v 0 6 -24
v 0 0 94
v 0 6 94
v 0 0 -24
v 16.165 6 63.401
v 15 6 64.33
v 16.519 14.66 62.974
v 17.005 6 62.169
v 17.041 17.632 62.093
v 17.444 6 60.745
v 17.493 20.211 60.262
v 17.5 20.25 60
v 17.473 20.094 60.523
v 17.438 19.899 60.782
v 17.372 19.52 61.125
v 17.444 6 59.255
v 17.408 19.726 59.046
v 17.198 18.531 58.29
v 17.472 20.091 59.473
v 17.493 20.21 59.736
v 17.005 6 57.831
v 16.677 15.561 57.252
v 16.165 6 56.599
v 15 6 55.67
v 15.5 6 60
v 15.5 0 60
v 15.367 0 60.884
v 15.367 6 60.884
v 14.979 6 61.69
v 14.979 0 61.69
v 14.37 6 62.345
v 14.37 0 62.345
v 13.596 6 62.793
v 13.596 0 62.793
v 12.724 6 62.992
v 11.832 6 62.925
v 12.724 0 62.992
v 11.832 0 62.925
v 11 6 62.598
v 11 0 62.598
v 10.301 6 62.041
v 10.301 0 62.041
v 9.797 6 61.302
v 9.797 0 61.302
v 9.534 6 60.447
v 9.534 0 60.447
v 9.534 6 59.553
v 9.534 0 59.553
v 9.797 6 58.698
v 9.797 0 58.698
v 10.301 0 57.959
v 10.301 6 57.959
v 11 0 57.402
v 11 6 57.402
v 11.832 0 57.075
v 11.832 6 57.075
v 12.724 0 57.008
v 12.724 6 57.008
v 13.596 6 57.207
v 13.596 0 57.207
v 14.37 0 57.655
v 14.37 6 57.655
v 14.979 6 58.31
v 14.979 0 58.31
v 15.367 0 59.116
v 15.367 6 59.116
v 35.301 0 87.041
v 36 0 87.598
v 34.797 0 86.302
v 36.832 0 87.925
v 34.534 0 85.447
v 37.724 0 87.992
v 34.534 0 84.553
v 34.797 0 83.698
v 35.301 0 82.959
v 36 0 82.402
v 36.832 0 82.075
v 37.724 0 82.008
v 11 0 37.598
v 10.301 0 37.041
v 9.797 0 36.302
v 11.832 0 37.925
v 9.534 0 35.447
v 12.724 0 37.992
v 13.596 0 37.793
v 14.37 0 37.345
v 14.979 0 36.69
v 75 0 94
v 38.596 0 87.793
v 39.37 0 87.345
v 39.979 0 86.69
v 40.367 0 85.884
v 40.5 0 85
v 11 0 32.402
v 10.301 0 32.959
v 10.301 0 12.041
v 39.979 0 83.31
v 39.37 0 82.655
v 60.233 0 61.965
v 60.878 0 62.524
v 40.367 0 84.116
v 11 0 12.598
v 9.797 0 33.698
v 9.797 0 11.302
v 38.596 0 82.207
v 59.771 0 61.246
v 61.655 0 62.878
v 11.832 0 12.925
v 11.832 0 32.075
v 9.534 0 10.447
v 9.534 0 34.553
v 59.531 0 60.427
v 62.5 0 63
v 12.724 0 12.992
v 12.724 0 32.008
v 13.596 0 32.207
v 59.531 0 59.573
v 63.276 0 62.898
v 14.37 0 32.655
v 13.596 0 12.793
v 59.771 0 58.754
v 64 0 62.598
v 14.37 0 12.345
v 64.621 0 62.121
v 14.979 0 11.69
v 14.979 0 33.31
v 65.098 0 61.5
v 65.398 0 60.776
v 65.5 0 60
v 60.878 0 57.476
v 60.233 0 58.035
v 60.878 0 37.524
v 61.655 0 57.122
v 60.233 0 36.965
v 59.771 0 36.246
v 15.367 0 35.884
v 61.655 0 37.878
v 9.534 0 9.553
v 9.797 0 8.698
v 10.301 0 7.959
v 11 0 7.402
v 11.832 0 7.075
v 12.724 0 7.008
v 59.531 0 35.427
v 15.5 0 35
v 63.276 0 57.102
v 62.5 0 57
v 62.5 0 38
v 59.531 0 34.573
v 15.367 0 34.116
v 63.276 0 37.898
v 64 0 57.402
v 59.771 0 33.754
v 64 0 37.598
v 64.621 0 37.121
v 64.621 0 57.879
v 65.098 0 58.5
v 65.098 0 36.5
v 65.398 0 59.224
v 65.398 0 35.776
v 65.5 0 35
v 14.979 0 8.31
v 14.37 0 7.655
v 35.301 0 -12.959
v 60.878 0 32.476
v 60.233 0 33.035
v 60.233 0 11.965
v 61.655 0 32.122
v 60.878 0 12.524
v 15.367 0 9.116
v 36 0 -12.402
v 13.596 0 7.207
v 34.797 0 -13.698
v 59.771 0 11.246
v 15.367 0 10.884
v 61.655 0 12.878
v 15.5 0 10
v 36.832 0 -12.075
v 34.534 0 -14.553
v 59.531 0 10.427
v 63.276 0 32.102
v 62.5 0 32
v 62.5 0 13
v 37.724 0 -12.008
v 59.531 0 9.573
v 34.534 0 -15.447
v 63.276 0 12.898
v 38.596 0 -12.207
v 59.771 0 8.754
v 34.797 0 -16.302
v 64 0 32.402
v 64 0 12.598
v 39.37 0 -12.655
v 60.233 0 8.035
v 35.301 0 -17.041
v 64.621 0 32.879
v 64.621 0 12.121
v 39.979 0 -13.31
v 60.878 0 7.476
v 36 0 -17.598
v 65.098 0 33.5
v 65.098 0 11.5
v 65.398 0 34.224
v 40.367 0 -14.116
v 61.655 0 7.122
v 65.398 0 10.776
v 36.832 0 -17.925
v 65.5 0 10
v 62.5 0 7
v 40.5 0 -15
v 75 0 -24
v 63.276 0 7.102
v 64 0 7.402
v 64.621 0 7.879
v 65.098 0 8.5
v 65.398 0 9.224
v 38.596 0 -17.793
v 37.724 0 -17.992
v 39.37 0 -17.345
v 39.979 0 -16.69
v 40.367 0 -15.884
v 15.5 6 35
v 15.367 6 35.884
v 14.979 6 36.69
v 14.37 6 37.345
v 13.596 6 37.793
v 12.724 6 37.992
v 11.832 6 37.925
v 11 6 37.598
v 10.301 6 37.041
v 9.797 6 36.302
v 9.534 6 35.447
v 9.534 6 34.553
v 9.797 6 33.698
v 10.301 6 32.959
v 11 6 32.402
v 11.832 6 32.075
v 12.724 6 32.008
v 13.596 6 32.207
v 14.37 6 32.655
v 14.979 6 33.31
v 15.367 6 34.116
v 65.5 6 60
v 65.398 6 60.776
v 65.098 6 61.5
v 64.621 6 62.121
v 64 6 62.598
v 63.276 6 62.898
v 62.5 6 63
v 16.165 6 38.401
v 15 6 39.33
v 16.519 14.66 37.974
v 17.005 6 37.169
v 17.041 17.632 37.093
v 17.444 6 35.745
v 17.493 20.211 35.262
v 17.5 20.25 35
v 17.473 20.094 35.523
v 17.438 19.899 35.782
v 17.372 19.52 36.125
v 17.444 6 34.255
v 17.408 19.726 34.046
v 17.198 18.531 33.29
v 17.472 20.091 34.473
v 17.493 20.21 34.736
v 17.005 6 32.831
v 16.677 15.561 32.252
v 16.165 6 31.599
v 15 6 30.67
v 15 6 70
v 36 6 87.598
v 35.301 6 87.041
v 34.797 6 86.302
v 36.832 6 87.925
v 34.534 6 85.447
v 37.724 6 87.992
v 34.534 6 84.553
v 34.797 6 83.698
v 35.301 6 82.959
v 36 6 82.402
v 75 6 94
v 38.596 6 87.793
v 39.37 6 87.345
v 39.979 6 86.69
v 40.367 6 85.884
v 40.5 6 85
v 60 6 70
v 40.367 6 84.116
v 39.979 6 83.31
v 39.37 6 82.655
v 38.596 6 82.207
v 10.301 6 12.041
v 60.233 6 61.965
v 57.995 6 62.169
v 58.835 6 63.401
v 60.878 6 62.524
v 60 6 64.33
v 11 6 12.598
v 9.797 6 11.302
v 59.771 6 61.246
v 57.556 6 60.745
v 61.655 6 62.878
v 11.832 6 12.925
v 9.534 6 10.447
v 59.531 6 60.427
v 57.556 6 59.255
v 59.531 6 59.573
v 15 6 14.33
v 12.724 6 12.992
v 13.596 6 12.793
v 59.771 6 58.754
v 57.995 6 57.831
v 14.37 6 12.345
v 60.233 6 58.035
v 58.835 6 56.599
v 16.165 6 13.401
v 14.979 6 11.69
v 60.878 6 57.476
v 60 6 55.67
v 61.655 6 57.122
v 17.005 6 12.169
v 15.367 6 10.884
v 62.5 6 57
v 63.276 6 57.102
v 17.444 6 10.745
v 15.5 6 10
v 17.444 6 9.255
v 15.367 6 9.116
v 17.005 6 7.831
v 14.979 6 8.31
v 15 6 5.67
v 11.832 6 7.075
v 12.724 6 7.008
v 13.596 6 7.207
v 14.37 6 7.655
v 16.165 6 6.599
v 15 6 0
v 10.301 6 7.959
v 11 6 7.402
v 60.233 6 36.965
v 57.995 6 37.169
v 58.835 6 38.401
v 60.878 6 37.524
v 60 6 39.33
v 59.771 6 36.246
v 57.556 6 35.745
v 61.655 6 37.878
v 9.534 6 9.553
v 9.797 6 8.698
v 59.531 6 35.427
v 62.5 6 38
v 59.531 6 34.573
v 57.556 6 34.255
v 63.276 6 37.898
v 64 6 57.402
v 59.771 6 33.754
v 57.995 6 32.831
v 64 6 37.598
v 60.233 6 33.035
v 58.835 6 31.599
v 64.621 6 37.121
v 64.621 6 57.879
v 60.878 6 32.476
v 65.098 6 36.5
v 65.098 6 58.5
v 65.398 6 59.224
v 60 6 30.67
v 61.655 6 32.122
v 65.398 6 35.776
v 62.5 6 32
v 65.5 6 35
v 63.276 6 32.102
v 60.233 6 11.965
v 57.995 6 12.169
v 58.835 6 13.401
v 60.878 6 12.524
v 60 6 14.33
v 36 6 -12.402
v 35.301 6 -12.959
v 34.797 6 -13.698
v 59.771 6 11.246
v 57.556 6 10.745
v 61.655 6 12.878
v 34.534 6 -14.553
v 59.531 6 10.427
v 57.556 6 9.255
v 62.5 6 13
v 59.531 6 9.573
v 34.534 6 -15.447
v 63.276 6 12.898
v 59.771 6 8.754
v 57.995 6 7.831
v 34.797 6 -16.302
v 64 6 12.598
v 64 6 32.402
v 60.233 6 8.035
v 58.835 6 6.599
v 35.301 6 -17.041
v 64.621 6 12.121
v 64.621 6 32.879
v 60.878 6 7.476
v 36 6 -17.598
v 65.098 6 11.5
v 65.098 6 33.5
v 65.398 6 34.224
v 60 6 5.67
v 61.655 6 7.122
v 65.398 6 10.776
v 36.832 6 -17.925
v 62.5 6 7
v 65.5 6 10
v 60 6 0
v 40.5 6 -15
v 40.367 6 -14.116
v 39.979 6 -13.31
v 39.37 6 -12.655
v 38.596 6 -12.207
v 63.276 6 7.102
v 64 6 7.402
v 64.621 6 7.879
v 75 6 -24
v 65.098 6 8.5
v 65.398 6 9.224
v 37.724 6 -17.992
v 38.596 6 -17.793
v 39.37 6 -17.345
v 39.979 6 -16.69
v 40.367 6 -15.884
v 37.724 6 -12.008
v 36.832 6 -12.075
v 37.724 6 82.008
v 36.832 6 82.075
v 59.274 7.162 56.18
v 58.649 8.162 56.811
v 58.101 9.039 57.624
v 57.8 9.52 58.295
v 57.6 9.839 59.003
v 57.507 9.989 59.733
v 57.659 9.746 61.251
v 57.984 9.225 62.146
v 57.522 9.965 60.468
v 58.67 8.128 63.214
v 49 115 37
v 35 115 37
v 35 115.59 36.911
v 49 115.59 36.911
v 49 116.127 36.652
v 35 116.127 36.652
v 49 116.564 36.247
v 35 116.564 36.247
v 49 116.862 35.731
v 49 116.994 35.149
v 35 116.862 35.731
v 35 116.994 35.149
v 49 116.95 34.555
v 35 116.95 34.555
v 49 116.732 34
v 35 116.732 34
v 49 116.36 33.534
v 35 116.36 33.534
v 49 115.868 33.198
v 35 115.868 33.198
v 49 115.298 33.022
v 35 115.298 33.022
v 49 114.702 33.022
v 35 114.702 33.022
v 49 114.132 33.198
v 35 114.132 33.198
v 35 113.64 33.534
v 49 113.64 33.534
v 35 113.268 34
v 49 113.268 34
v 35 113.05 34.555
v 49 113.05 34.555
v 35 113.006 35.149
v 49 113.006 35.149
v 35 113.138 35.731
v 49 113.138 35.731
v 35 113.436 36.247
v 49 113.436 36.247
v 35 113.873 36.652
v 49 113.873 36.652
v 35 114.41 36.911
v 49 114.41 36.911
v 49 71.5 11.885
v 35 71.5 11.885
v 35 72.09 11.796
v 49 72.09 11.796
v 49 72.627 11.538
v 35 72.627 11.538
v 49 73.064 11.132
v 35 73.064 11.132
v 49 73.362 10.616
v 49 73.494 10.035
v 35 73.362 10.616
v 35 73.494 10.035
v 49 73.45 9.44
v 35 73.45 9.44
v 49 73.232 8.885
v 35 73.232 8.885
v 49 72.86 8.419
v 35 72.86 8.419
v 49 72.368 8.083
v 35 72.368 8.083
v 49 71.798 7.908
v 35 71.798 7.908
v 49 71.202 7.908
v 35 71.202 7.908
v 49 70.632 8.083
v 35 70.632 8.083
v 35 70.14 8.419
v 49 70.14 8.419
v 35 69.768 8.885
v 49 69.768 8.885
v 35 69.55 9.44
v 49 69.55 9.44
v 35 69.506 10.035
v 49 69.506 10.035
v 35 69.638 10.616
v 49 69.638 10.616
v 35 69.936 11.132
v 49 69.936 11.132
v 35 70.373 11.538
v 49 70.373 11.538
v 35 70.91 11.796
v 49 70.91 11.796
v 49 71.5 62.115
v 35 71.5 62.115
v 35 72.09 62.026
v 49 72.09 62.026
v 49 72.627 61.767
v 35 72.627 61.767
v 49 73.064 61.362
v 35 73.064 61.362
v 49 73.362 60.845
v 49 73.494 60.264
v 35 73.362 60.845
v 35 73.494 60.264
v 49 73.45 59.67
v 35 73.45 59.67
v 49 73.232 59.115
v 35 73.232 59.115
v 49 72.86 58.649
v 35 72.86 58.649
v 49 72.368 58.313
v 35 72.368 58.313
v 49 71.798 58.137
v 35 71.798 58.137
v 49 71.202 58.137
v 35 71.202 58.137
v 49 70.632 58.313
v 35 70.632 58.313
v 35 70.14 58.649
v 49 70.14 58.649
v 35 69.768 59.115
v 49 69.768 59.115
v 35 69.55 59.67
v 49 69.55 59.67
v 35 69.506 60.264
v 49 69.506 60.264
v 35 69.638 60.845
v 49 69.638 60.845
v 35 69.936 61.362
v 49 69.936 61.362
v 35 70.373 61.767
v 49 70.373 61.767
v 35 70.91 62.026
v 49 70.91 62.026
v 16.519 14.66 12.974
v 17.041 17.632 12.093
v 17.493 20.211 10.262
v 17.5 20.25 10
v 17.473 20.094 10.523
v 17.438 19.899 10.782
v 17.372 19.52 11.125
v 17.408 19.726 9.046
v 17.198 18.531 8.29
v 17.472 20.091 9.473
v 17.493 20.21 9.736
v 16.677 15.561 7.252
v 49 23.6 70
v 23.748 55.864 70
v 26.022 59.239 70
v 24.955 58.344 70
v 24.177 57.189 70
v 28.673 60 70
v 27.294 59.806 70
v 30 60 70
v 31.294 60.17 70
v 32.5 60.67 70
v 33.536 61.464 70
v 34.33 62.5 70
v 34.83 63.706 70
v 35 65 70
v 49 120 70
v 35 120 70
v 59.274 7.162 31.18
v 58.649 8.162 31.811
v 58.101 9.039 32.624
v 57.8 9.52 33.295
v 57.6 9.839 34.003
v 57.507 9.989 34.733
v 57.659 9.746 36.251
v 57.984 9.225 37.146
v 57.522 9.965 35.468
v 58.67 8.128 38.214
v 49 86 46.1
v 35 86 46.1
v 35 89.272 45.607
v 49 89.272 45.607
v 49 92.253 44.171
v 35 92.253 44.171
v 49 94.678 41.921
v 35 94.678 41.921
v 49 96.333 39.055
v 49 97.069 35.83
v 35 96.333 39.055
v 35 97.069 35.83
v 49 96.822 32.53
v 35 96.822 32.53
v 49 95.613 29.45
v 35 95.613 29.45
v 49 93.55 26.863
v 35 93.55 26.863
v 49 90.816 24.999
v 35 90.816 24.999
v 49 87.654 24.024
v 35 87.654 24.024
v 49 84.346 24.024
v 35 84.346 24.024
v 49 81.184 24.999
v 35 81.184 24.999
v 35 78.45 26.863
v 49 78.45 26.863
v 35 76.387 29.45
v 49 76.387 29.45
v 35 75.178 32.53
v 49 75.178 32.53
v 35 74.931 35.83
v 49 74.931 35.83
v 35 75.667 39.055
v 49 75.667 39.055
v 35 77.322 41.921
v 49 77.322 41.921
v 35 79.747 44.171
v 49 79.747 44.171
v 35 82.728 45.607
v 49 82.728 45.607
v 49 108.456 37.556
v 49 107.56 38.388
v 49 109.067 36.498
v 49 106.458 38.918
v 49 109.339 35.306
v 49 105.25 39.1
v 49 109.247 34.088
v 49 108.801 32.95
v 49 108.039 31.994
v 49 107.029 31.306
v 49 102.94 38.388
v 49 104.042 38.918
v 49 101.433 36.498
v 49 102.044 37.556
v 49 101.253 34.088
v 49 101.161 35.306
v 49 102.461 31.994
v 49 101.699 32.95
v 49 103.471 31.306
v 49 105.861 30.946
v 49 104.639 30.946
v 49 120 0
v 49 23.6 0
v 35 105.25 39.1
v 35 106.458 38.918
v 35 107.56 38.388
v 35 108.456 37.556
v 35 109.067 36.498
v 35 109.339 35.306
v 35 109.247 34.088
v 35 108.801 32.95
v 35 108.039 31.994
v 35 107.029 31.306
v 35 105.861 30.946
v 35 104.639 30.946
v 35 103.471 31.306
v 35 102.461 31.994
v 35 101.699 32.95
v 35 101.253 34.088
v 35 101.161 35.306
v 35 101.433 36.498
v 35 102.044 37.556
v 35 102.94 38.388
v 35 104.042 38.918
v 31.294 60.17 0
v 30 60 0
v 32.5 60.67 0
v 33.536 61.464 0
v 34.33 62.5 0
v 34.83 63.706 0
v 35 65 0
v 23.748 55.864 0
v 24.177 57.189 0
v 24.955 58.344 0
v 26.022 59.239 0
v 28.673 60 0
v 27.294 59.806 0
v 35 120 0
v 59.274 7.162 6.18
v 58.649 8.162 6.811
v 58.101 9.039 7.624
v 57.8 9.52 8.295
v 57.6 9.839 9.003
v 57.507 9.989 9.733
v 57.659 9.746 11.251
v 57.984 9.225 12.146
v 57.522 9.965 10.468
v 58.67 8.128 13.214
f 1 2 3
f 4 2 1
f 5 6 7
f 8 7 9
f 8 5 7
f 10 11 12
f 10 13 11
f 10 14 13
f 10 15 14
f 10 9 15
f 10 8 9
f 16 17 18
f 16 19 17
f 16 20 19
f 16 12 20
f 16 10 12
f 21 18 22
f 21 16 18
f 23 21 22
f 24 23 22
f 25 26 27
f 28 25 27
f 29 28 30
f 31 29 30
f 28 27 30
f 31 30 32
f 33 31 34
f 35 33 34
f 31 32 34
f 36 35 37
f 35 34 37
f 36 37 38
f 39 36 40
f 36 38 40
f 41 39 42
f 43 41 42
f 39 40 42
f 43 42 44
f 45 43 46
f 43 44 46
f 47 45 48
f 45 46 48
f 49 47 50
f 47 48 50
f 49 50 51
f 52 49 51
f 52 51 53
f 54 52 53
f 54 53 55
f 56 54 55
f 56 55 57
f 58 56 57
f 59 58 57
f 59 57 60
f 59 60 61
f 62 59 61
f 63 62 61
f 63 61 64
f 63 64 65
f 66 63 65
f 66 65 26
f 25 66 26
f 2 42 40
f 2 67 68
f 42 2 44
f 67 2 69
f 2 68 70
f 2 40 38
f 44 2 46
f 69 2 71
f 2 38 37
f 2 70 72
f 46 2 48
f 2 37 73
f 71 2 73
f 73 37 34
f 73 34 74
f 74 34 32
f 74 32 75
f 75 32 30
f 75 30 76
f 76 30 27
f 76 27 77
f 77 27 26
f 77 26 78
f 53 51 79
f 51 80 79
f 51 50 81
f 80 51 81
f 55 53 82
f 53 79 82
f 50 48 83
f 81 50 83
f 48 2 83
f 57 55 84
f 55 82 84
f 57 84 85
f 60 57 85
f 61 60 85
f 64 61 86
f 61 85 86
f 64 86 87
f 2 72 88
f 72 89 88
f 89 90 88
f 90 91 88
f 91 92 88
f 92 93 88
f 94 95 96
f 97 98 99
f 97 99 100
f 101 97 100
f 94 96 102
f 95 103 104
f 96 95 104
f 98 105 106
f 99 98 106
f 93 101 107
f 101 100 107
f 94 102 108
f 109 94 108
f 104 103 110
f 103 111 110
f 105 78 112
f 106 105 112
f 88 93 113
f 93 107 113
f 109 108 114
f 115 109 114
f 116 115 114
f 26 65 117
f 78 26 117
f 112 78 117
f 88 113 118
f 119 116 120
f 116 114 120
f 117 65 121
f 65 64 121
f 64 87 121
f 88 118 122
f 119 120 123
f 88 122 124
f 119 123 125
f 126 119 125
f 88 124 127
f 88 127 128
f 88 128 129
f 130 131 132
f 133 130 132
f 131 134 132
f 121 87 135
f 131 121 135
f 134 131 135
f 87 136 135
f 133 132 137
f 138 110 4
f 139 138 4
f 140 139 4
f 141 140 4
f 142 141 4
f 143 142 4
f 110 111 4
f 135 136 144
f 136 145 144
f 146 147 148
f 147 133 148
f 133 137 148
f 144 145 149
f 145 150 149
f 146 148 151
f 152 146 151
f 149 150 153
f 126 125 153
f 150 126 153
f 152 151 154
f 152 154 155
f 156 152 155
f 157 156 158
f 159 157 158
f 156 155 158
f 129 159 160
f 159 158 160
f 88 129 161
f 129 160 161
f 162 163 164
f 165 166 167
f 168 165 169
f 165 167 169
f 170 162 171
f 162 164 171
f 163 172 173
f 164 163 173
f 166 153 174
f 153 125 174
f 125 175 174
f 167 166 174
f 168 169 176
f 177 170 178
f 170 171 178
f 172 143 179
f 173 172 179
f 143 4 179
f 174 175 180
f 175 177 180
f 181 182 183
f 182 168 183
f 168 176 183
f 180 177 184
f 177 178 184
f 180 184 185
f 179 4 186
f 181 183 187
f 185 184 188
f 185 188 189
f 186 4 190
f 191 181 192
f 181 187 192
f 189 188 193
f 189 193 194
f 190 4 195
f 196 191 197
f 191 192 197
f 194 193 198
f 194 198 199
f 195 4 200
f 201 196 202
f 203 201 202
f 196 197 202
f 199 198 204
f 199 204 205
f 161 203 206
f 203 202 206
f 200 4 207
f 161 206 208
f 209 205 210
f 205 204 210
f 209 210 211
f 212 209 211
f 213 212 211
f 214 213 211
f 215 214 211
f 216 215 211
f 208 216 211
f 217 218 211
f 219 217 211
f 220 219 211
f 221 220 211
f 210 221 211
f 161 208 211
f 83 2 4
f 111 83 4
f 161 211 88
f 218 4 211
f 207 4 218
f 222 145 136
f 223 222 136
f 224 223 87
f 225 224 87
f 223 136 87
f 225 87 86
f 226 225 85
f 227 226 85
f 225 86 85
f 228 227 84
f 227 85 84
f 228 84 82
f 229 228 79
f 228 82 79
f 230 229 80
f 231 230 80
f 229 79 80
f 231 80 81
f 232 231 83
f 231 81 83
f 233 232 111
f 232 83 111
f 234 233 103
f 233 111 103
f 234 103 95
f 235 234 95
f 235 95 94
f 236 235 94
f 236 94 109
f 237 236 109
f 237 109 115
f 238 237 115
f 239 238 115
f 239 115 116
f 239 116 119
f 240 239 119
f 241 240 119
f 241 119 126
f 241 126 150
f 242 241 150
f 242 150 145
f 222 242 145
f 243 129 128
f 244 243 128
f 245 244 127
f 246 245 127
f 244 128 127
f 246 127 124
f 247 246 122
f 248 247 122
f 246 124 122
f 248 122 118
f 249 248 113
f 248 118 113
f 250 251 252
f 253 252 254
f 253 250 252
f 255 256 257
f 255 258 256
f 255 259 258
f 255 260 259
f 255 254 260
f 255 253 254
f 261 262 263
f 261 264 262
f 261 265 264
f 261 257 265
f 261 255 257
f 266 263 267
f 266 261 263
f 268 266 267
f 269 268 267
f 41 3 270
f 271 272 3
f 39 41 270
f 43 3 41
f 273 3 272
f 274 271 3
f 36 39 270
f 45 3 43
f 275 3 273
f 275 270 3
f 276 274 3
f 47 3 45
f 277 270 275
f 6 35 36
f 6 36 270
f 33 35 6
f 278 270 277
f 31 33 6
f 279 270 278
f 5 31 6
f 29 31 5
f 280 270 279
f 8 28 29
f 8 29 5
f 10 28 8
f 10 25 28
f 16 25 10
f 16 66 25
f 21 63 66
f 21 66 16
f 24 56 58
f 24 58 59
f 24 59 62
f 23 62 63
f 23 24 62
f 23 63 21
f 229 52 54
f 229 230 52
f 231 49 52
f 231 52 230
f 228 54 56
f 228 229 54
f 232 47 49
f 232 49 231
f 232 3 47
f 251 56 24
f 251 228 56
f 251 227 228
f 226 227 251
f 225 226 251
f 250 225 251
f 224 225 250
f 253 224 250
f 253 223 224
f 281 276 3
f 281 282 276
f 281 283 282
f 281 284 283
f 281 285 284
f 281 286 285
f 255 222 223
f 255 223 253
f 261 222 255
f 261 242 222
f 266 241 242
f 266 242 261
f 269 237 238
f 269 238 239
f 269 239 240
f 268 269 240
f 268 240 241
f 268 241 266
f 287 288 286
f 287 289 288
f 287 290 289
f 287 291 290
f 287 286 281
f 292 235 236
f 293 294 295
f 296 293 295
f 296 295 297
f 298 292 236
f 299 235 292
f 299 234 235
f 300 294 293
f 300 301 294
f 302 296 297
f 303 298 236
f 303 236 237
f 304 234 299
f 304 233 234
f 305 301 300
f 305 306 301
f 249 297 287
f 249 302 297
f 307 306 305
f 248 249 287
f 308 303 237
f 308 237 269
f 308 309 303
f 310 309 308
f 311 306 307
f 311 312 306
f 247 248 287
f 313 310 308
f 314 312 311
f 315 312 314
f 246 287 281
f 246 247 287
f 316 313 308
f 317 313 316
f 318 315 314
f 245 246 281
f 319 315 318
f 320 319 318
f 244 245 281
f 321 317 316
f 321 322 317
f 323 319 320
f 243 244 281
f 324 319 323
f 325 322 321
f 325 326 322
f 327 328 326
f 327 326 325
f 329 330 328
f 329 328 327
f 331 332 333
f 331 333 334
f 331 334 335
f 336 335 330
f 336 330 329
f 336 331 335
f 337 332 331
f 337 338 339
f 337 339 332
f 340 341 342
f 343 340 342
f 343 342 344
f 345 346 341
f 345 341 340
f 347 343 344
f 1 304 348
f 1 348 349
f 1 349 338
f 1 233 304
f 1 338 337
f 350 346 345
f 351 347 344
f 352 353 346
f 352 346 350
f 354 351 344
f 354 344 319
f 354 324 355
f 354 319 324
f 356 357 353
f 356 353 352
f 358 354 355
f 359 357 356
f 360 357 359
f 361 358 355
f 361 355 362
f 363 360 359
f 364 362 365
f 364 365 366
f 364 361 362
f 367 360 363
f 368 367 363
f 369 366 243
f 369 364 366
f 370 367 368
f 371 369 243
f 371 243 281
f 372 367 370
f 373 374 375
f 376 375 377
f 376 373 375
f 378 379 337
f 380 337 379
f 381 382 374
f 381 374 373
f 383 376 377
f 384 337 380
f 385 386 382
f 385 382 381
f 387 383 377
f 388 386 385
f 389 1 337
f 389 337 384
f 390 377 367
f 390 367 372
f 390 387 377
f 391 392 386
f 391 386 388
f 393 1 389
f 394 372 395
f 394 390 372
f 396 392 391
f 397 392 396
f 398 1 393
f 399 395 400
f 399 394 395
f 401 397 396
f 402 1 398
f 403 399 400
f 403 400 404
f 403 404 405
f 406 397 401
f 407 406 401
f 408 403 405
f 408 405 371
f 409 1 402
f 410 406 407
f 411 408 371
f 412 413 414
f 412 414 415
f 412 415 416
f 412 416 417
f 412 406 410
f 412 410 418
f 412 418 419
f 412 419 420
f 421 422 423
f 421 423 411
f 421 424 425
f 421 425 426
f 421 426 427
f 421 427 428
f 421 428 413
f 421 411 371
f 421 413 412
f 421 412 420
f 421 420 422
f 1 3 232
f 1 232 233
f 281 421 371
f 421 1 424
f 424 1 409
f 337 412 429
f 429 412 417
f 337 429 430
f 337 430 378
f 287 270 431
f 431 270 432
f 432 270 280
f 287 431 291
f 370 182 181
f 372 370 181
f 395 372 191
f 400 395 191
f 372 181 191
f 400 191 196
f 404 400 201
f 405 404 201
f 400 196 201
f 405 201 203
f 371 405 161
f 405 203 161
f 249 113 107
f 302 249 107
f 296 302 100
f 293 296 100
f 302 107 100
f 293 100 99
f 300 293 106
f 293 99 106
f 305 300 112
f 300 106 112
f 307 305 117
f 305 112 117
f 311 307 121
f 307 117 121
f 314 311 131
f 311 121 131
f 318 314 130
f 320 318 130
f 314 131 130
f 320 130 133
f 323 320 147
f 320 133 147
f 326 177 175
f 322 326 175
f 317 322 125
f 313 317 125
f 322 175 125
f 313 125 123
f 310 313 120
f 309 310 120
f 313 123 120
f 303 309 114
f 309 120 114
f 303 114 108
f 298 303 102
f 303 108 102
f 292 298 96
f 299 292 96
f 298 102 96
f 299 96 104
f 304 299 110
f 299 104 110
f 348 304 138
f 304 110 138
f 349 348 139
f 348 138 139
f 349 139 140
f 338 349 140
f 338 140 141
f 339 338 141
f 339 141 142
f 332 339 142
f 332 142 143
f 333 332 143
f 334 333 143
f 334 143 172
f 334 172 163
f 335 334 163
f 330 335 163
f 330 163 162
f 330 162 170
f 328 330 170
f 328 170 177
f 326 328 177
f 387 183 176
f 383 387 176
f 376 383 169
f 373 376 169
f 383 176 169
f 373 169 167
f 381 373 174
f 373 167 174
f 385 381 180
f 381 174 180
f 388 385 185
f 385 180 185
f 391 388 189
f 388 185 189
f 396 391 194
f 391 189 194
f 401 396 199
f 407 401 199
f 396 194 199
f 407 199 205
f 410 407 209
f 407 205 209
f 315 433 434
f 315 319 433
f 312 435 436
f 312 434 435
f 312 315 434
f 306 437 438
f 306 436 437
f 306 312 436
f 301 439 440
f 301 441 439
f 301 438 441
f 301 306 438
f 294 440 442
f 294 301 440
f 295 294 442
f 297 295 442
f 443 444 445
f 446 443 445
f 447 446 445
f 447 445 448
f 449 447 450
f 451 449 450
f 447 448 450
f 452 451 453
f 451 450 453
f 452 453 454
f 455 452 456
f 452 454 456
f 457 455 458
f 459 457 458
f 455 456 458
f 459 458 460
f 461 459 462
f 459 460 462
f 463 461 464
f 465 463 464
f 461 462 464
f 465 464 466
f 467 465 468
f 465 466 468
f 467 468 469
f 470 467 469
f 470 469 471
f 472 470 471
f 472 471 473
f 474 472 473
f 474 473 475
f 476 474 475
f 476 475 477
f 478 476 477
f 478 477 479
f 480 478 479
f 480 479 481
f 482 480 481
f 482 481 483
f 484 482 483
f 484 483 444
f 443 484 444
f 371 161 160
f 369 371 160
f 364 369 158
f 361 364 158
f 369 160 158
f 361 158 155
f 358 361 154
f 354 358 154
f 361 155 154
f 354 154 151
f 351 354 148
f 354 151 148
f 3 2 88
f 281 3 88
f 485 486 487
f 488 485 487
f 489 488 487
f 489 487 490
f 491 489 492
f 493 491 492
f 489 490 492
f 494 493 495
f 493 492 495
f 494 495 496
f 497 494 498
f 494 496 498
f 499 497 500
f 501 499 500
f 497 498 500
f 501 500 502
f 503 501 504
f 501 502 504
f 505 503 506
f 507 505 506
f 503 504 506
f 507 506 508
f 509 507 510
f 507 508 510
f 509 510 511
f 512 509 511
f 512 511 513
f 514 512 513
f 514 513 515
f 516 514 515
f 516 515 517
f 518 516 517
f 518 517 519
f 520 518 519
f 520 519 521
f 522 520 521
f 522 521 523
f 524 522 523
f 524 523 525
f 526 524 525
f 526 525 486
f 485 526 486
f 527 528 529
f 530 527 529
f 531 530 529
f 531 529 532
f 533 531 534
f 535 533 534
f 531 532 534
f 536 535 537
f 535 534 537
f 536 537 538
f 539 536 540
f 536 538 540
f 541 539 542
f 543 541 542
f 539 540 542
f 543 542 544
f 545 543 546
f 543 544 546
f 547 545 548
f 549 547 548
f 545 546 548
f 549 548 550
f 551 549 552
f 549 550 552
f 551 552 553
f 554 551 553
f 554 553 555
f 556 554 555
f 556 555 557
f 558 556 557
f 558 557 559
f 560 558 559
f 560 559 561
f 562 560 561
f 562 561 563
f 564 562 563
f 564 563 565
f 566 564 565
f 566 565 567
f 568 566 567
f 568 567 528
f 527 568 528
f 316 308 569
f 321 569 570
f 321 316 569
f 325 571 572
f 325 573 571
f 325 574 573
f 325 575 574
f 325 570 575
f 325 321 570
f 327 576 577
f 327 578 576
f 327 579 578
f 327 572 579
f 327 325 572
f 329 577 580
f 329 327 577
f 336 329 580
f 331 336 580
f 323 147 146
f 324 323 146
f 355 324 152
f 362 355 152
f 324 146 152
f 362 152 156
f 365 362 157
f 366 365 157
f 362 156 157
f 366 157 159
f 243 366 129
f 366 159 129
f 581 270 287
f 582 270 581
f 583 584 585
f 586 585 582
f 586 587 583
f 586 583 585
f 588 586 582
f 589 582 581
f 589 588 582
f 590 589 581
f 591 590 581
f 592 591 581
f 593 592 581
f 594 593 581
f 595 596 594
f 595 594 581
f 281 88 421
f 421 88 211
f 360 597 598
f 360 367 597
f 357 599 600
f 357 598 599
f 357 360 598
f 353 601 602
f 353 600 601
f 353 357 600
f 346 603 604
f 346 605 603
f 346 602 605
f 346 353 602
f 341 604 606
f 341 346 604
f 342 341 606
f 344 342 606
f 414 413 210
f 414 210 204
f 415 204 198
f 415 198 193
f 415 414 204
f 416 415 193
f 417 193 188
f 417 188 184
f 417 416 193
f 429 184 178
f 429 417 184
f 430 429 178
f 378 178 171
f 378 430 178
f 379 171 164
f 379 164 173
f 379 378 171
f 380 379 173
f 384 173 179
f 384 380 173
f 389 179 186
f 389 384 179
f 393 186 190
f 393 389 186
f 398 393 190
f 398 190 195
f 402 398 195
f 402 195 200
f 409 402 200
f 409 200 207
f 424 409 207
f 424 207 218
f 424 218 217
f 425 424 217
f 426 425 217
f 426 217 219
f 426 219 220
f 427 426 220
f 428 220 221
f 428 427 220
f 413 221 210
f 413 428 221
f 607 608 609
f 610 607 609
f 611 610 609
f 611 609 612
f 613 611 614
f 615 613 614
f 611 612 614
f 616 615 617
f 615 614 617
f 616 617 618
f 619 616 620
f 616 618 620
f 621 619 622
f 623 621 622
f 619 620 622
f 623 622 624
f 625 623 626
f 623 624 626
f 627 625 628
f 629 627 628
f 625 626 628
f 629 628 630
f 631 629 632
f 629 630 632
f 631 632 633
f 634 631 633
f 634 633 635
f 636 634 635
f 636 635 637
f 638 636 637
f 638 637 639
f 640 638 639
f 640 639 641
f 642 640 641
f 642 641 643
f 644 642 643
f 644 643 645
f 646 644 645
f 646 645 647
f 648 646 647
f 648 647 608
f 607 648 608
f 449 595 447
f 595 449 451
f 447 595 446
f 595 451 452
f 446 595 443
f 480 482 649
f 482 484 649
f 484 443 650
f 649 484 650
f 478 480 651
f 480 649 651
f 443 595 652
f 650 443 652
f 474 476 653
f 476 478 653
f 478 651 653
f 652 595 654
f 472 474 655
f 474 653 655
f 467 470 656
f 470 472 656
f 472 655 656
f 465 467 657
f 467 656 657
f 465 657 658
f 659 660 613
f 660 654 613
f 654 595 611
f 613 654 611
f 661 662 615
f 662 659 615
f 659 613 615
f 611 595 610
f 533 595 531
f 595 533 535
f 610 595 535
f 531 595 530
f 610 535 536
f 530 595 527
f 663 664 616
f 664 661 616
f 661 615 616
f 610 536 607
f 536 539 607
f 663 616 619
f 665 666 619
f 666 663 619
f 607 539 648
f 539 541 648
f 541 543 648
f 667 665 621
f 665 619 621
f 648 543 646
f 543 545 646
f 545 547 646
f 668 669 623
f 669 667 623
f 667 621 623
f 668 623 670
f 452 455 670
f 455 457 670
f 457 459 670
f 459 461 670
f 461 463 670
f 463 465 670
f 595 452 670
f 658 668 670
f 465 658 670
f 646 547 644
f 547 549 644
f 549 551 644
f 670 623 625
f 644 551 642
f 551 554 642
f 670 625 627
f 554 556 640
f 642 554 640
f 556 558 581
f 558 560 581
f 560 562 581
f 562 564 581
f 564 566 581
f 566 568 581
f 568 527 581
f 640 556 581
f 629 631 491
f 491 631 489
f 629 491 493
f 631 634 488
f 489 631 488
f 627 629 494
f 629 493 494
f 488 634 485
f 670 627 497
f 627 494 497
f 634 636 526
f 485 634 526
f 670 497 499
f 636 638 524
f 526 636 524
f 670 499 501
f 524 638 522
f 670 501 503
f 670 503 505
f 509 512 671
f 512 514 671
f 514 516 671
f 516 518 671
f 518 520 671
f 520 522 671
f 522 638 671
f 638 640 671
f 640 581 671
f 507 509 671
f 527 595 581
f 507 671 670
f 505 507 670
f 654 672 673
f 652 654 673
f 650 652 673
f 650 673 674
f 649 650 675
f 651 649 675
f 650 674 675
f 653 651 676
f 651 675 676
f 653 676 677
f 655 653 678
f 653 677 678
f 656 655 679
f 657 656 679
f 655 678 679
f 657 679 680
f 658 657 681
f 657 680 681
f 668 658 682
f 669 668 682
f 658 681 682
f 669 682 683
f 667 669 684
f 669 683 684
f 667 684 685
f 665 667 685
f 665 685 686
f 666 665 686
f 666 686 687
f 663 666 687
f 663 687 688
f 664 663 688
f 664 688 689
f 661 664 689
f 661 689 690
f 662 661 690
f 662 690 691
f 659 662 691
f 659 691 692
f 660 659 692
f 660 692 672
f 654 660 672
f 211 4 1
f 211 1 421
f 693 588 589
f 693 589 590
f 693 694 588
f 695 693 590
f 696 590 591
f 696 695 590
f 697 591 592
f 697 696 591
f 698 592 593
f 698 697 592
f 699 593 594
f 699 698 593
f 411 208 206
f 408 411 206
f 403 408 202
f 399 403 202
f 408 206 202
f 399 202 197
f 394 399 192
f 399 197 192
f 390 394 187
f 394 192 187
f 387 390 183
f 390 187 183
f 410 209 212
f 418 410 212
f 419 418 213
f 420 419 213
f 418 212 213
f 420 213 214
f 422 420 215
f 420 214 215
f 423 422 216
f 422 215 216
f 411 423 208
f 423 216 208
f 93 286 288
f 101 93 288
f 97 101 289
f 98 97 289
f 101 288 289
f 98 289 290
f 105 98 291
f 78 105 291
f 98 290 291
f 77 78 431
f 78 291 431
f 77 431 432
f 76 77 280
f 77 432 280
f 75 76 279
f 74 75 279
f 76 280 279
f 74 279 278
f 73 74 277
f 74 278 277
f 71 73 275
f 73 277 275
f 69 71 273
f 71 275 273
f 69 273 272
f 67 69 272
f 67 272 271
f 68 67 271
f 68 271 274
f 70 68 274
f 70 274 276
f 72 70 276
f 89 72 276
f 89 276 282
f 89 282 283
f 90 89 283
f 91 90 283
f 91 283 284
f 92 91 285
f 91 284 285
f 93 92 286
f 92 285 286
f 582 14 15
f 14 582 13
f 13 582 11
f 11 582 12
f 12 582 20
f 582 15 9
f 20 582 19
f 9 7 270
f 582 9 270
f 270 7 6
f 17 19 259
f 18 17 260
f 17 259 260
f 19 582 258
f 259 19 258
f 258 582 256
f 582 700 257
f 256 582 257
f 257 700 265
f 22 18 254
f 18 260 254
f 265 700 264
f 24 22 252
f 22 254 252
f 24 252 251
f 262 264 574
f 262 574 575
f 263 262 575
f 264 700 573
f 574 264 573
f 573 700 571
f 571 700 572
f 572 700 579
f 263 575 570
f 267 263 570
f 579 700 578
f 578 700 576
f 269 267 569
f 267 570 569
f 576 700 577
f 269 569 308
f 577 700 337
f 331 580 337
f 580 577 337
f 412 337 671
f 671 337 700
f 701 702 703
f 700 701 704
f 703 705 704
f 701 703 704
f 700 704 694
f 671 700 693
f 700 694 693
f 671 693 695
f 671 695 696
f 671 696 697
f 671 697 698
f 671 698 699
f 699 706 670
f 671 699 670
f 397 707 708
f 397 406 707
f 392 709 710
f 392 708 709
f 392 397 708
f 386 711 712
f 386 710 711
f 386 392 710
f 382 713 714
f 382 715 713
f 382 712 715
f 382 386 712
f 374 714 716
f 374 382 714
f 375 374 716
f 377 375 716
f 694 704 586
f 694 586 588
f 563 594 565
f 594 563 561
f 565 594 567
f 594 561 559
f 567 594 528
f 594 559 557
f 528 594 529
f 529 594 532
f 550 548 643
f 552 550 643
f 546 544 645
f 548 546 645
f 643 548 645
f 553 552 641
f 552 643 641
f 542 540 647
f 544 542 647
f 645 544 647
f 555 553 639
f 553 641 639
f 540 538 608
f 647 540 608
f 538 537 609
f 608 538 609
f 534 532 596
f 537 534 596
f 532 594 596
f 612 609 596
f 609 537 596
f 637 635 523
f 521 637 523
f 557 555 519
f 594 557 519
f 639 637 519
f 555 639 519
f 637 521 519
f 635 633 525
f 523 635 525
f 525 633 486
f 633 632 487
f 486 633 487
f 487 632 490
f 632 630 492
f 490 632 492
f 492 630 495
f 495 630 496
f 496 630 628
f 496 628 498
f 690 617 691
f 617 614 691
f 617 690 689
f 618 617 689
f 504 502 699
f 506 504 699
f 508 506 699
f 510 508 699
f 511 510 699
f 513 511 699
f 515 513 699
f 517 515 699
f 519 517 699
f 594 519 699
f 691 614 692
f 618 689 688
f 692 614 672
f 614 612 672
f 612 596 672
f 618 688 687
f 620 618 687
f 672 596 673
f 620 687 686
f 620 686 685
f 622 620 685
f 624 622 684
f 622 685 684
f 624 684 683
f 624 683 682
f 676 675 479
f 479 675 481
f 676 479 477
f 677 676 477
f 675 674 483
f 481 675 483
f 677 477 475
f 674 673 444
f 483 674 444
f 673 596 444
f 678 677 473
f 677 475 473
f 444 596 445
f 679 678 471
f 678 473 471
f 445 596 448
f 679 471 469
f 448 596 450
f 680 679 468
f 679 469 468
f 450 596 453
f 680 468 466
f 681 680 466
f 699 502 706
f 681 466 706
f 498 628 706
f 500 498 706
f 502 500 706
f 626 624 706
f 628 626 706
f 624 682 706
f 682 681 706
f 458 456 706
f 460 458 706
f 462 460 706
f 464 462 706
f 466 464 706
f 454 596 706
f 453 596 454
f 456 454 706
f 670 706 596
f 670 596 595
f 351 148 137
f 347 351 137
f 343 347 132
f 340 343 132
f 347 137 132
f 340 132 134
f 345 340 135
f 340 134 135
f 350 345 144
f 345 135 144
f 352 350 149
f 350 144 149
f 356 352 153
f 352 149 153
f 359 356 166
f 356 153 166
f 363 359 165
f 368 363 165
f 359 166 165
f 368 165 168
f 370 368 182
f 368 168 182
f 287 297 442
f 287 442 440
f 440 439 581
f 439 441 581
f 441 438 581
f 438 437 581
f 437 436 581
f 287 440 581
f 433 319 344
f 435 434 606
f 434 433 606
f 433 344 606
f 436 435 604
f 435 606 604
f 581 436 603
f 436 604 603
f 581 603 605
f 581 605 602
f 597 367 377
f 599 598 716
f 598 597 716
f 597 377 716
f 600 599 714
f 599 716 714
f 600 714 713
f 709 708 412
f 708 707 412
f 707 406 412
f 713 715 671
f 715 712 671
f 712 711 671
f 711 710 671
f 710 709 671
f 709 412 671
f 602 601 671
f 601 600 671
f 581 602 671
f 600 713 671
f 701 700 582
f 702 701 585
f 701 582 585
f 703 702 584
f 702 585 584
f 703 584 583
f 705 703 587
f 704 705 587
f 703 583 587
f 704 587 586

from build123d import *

# Parameters (mm, degrees)
SKETCH_1_W               = 35
SKETCH_1_H               = 70
EXTRUDE_1_DEPTH          = 6
SKETCH_1_W_2             = 26
EXTRUDE_1_2_DEPTH        = 6
SKETCH_1_3_W             = 14
SKETCH_1_3_H             = 70
EXTRUDE_2_DEPTH          = 120
EXTRUDE_4_DEPTH          = 70
EXTRUDE_7_DEPTH          = 70
SKETCH_7_R               = 3
CUT_EXTRUDE_4_DEPTH      = 121
SKETCH_8_R               = 5
CUT_EXTRUDE_5_DEPTH      = 115
SKETCH_3_R               = 11.1
SKETCH_3_R_2             = 4.1
SKETCH_3_R_3             = 2
CUT_EXTRUDE_8_DEPTH      = 36
CUT_EXTRUDE_8_DEPTH_BACK = 41
SKETCH_10_W              = 75
SKETCH_10_H              = 24
EXTRUDE_8_DEPTH          = 6
SKETCH_11_R              = 3
CUT_EXTRUDE_9_DEPTH      = 6
SKETCH_12_W              = 56.46589335
SKETCH_12_H              = 70
CUT_EXTRUDE_10_DEPTH     = 60
FILLET_1_R               = 5


with BuildPart() as part:
    # 草图1 → 凸台-拉伸1 (new body)
    with BuildSketch(Plane(origin=(0, 0, 0), x_dir=(1, 0, 0), z_dir=(0, 1, 0))):
        with Locations((17.5, -35)):
            Rectangle(SKETCH_1_W, SKETCH_1_H)
    extrude(amount=EXTRUDE_1_DEPTH)



with BuildPart() as body_2:
    # 草图1 → Extrude 1 2 (new body)
    with BuildSketch(Plane(origin=(0, 0, 0), x_dir=(1, 0, 0), z_dir=(0, 1, 0))):
        with Locations((62, -35)):
            Rectangle(SKETCH_1_W_2, SKETCH_1_H)
    extrude(amount=EXTRUDE_1_2_DEPTH)


with BuildPart() as part_1:
    add(part.part)

    add(body_2.part)  # 凸台-拉伸2 merges body 2
    # 草图1<3> → 凸台-拉伸2 (add)
    with BuildSketch(Plane(origin=(0, 0, 0), x_dir=(1, 0, 0), z_dir=(0, 1, 0))):
        with Locations((42, -35)):
            Rectangle(SKETCH_1_3_W, SKETCH_1_3_H)
    extrude(amount=EXTRUDE_2_DEPTH)

    # 草图4 → 凸台-拉伸4 (add, through all)
    with BuildSketch(Plane(origin=(0, 0, 0), x_dir=(-1, 0, 0), z_dir=(0, 0, -1))):
        Polygon((-35, 6), (-15, 6), (-35, 38), align=None)
        Polygon((-60, 6), (-40, 38), (-40, 6), align=None)
    extrude(amount=-EXTRUDE_4_DEPTH)

    # 草图9 → 凸台-拉伸7 (add, through all)
    with BuildSketch(Plane(origin=(0, 0, 0), x_dir=(-1, 0, 0), z_dir=(0, 0, -1))):
        Polygon((-35, 120), (-15, 6), (-35, 0), align=None)
    extrude(amount=-EXTRUDE_7_DEPTH)

    # 草图7 → 切除-拉伸4 (cut, through all)
    with BuildSketch(Plane.XZ):
        with Locations((12.5, 35)):
            Circle(SKETCH_7_R)
        with Locations((12.5, 60)):
            Circle(SKETCH_7_R)
        with Locations((12.5, 10)):
            Circle(SKETCH_7_R)
        with BuildLine():
            ThreePointArc((65.5, 10), (64.621320344, 12.121320344), (62.5, 13))
            Line((62.5, 13), (62.5, 7))
            ThreePointArc((62.5, 7), (64.621320344, 7.878679656), (65.5, 10))
        make_face()
        with BuildLine():
            Line((62.5, 7), (62.5, 13))
            ThreePointArc((62.5, 13), (59.5, 10), (62.5, 7))
        make_face()
        with BuildLine():
            ThreePointArc((65.5, 35), (64.621320344, 37.121320344), (62.5, 38))
            Line((62.5, 38), (62.5, 32))
            ThreePointArc((62.5, 32), (64.621320344, 32.878679656), (65.5, 35))
        make_face()
        with BuildLine():
            Line((62.5, 32), (62.5, 38))
            ThreePointArc((62.5, 38), (59.5, 35), (62.5, 32))
        make_face()
        with BuildLine():
            ThreePointArc((65.5, 60), (64.621320344, 62.121320344), (62.5, 63))
            Line((62.5, 63), (62.5, 57))
            ThreePointArc((62.5, 57), (64.621320344, 57.878679656), (65.5, 60))
        make_face()
        with BuildLine():
            Line((62.5, 57), (62.5, 63))
            ThreePointArc((62.5, 63), (59.5, 60), (62.5, 57))
        make_face()
    extrude(amount=-CUT_EXTRUDE_4_DEPTH, mode=Mode.SUBTRACT)

    # 草图8 → 切除-拉伸5 (cut)
    with BuildSketch(Plane(origin=(0, 6, 0), x_dir=(1, 0, 0), z_dir=(0, 1, 0))):
        with Locations((12.5, -10)):
            Circle(SKETCH_8_R)
        with Locations((62.5, -10)):
            Circle(SKETCH_8_R)
        with Locations((62.5, -35)):
            Circle(SKETCH_8_R)
        with Locations((62.5, -60)):
            Circle(SKETCH_8_R)
        with Locations((12.5, -35)):
            Circle(SKETCH_8_R)
        with Locations((12.5, -60)):
            Circle(SKETCH_8_R)
    extrude(amount=CUT_EXTRUDE_5_DEPTH, mode=Mode.SUBTRACT)

    # 草图3 → 切除-拉伸8 (cut, two sides)
    with BuildSketch(Plane.ZY.offset(-35)) as cut_extrude_8_sk:
        with Locations((35, 86)):
            Circle(SKETCH_3_R)
        with Locations((35, 105.25)):
            Circle(SKETCH_3_R_2)
        with Locations((35, 115)):
            Circle(SKETCH_3_R_3)
        with Locations((60.11473671, 71.5)):
            Circle(SKETCH_3_R_3)
        with Locations((9.88526329, 71.5)):
            Circle(SKETCH_3_R_3)
    extrude(amount=CUT_EXTRUDE_8_DEPTH, mode=Mode.SUBTRACT)
    extrude(cut_extrude_8_sk.sketch, amount=-CUT_EXTRUDE_8_DEPTH_BACK, mode=Mode.SUBTRACT)

    # 草图10 → 凸台-拉伸8 (add)
    with BuildSketch(Plane.XZ):
        with Locations((37.5, 82)):
            Rectangle(SKETCH_10_W, SKETCH_10_H)
    extrude_8 = extrude(amount=-EXTRUDE_8_DEPTH)

    # 草图11 → 切除-拉伸9 (cut)
    with BuildSketch(Plane(origin=(0, 6, 0), x_dir=(1, 0, 0), z_dir=(0, 1, 0))):
        with Locations((37.5, -85)):
            Circle(SKETCH_11_R)
    cut_extrude_9 = extrude(amount=-CUT_EXTRUDE_9_DEPTH, mode=Mode.SUBTRACT)

    # 镜向1: 凸台-拉伸8, 切除-拉伸9 across plane
    add(extrude_8.mirror(Plane.XY.offset(35)))
    add(cut_extrude_9.mirror(Plane.XY.offset(35)), mode=Mode.SUBTRACT)

    # 草图12 → 切除-拉伸10 (cut)
    with BuildSketch(Plane(origin=(0, 120, 0), x_dir=(1, 0, 0), z_dir=(0, 1, 0))):
        with Locations((6.767053325, -35)):
            Rectangle(SKETCH_12_W, SKETCH_12_H)
    extrude(amount=-CUT_EXTRUDE_10_DEPTH, mode=Mode.SUBTRACT)

    # 圆角1
    fillet_1_edges = [part_1.edges().sort_by_distance(p)[0] for p in [
        (24.473684211, 60, 35),
        (35, 60, 35),
    ]]
    fillet(fillet_1_edges, radius=FILLET_1_R)


solid = part_1.part
